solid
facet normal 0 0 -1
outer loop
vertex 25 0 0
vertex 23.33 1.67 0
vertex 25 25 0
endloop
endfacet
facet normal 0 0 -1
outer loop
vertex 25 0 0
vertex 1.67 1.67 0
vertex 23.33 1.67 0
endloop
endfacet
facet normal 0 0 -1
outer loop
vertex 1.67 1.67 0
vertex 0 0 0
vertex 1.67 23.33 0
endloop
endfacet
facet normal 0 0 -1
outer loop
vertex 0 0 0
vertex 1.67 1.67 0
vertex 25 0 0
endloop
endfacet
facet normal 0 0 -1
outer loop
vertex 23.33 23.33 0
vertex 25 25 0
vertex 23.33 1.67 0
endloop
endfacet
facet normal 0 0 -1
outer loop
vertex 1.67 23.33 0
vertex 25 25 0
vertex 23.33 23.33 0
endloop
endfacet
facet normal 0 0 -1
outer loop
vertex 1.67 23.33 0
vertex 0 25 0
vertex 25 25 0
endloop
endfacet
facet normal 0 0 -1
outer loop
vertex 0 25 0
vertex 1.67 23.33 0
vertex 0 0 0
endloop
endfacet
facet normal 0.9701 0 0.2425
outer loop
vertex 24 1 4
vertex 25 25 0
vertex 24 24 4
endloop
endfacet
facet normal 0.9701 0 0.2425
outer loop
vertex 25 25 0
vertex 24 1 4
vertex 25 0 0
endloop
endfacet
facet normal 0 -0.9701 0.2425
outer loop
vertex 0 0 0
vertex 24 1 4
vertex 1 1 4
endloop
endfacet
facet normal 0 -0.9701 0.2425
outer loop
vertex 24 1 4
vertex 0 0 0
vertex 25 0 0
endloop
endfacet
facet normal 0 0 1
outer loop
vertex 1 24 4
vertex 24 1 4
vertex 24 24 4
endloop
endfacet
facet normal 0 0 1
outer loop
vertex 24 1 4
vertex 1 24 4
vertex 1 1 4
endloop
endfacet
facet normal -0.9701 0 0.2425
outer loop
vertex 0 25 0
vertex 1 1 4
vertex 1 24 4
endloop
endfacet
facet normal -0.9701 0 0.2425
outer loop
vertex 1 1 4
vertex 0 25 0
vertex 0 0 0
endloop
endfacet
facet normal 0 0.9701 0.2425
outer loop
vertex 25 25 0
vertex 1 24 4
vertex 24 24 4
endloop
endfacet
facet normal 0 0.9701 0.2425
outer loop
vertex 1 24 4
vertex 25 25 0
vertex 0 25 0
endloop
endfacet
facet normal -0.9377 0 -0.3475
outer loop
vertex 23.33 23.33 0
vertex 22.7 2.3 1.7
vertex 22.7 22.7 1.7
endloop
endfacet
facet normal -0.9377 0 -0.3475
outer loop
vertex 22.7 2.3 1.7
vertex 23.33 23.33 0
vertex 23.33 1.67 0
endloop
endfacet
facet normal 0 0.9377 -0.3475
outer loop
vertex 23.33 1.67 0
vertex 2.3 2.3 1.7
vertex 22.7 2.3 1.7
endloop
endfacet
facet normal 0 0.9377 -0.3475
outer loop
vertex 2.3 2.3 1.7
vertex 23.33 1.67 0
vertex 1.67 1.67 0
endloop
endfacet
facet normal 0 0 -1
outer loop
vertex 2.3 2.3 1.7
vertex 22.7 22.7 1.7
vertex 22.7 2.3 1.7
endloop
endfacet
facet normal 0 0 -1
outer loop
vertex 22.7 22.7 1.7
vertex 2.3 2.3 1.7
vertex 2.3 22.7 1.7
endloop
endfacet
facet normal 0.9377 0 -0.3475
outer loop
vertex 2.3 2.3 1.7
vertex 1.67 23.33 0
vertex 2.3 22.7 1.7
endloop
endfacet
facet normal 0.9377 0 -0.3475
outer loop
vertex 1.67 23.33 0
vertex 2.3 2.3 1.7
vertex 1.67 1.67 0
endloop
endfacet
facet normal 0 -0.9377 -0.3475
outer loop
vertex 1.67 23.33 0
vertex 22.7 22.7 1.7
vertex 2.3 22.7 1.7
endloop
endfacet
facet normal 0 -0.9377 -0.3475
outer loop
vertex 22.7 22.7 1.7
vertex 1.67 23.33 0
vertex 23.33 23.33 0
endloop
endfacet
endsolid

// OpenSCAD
// Copyright 2023 Stefano Linguerri
//
// Licensed under the Apache License, Version 2.0 (the "License");
// you may not use this file except in compliance with the License.
// You may obtain a copy of the License at
// http://www.apache.org/licenses/LICENSE-2.0
//
// Unless required by applicable law or agreed to in writing, software
// distributed under the License is distributed on an "AS IS" BASIS,
// WITHOUT WARRANTIES OR CONDITIONS OF ANY KIND, either express or implied.¢
// See the License for the specific language governing permissions and
// limitations under the License.

//height (thickness) of this tray
height = 4;
//base width 
base_width = 25;
//base length 
base_length = 25;
//thickness of the top and sides of the base
height_offset = 1.3;
//Inset of the top of the tray: greater the value greater the slope of the tray
inset = 1;
//magnets height (if greater than 0.1 will generate the magnet holders)
magnets_height = 0.1;
//magnets diameter
magnets_diameter = 0.1;

base_type = "0"; // [0:Hollow, 1:Solid]
//slotta hole width
slotta_width = 2;//0.1
//slotta hole length
slotta_length = 18;//0.1
//slotta type
slotta_type = "0"; // [0:None, 1:Parallel Center, 2:Parallel 3/4, 3:Diagonal]

module tray(offset, zOffset, height, base_width, base_length, inset) {
    
        
        b_total_cols = (base_width);
        b_total_rows = (base_length);
        
        t_total_cols = (base_width - inset *2);
        t_total_rows = (base_length - inset *2);
    
        translate(
            [offset,
            offset,
            zOffset]
        )

        polyhedron(
            points=[
                    [0,0,0],                        //base bottom left
                    [b_total_cols,0,0],             //base bottom right
                    [b_total_cols,b_total_rows,0],  //base top right
                    [0,b_total_rows,0],             //base top left


                    [inset,  inset,   height],                              //surface bottom left
                    [inset + t_total_cols, inset,  height],                 //surface bottom right
                    [inset + t_total_cols, inset + t_total_rows, height],   //surface top right
                    [inset,   inset + t_total_rows,  height]                //surface top left
                ],
            faces =[
                        [0,1,2,3],
                        [4,5,1,0],
                        [5,6,2,1],
                        [6,7,3,2],
                        [7,4,0,3],
                        [7,6,5,4]
                    ]
        ); 
           
}

module slotta (base_width, base_length,slotta_width,slotta_height, slotta_type, offset,inset) {   

    if(slotta_type == "1"){
        translate( 
            [inset*2, base_width/2, -0.1]
        )
        cube(size = [slotta_length,slotta_width,slotta_height+0.2]);
    }
    
    if(slotta_type == "2"){
        translate( 
            [inset*2, base_width/4, -0.1]
        )
        cube(size = [slotta_length,slotta_width,slotta_height+0.2]);
    }
    
    if(slotta_type == "3"){
        let(v_slotta_length = sqrt( (base_width-inset*5)*(base_width-inset*5)*2)-slotta_width*1.5 ){
        translate( 
            [base_width-(base_width - inset*2)+slotta_width, base_width-(base_width-inset*2)+slotta_width/2, -0.1]
        )

        rotate(45)

        cube(size = [v_slotta_length,slotta_width,slotta_height+0.2]);
        }
    }    
}

module magnets_holes (base_width, base_length, magnets_height, magnets_diameter) {   
    translate( 
        [base_width/2,
        base_length/2, 
        -0.1]
    )
    cylinder(d = magnets_diameter, h = magnets_height+0.01,$fn=30);
}

difference(){  
    
    color ([0.5, 0.5, 0.5]) {
        tray(0,0, height, base_width, base_length, inset);
    }
    
    if(base_type == "0"){
        color ([0.7, 0.7, 0.7]) {                   
            tray(height_offset, -1.0, height - height_offset, base_width - (2*height_offset), base_length - (2 * height_offset), inset);
        }   
    }
    
    if (magnets_height > 0.1){     
        magnets_holes (base_width, base_length, magnets_height, magnets_diameter);            
    }
    
    slotta(base_width,base_length,slotta_width,height,slotta_type,height_offset,inset);

}
